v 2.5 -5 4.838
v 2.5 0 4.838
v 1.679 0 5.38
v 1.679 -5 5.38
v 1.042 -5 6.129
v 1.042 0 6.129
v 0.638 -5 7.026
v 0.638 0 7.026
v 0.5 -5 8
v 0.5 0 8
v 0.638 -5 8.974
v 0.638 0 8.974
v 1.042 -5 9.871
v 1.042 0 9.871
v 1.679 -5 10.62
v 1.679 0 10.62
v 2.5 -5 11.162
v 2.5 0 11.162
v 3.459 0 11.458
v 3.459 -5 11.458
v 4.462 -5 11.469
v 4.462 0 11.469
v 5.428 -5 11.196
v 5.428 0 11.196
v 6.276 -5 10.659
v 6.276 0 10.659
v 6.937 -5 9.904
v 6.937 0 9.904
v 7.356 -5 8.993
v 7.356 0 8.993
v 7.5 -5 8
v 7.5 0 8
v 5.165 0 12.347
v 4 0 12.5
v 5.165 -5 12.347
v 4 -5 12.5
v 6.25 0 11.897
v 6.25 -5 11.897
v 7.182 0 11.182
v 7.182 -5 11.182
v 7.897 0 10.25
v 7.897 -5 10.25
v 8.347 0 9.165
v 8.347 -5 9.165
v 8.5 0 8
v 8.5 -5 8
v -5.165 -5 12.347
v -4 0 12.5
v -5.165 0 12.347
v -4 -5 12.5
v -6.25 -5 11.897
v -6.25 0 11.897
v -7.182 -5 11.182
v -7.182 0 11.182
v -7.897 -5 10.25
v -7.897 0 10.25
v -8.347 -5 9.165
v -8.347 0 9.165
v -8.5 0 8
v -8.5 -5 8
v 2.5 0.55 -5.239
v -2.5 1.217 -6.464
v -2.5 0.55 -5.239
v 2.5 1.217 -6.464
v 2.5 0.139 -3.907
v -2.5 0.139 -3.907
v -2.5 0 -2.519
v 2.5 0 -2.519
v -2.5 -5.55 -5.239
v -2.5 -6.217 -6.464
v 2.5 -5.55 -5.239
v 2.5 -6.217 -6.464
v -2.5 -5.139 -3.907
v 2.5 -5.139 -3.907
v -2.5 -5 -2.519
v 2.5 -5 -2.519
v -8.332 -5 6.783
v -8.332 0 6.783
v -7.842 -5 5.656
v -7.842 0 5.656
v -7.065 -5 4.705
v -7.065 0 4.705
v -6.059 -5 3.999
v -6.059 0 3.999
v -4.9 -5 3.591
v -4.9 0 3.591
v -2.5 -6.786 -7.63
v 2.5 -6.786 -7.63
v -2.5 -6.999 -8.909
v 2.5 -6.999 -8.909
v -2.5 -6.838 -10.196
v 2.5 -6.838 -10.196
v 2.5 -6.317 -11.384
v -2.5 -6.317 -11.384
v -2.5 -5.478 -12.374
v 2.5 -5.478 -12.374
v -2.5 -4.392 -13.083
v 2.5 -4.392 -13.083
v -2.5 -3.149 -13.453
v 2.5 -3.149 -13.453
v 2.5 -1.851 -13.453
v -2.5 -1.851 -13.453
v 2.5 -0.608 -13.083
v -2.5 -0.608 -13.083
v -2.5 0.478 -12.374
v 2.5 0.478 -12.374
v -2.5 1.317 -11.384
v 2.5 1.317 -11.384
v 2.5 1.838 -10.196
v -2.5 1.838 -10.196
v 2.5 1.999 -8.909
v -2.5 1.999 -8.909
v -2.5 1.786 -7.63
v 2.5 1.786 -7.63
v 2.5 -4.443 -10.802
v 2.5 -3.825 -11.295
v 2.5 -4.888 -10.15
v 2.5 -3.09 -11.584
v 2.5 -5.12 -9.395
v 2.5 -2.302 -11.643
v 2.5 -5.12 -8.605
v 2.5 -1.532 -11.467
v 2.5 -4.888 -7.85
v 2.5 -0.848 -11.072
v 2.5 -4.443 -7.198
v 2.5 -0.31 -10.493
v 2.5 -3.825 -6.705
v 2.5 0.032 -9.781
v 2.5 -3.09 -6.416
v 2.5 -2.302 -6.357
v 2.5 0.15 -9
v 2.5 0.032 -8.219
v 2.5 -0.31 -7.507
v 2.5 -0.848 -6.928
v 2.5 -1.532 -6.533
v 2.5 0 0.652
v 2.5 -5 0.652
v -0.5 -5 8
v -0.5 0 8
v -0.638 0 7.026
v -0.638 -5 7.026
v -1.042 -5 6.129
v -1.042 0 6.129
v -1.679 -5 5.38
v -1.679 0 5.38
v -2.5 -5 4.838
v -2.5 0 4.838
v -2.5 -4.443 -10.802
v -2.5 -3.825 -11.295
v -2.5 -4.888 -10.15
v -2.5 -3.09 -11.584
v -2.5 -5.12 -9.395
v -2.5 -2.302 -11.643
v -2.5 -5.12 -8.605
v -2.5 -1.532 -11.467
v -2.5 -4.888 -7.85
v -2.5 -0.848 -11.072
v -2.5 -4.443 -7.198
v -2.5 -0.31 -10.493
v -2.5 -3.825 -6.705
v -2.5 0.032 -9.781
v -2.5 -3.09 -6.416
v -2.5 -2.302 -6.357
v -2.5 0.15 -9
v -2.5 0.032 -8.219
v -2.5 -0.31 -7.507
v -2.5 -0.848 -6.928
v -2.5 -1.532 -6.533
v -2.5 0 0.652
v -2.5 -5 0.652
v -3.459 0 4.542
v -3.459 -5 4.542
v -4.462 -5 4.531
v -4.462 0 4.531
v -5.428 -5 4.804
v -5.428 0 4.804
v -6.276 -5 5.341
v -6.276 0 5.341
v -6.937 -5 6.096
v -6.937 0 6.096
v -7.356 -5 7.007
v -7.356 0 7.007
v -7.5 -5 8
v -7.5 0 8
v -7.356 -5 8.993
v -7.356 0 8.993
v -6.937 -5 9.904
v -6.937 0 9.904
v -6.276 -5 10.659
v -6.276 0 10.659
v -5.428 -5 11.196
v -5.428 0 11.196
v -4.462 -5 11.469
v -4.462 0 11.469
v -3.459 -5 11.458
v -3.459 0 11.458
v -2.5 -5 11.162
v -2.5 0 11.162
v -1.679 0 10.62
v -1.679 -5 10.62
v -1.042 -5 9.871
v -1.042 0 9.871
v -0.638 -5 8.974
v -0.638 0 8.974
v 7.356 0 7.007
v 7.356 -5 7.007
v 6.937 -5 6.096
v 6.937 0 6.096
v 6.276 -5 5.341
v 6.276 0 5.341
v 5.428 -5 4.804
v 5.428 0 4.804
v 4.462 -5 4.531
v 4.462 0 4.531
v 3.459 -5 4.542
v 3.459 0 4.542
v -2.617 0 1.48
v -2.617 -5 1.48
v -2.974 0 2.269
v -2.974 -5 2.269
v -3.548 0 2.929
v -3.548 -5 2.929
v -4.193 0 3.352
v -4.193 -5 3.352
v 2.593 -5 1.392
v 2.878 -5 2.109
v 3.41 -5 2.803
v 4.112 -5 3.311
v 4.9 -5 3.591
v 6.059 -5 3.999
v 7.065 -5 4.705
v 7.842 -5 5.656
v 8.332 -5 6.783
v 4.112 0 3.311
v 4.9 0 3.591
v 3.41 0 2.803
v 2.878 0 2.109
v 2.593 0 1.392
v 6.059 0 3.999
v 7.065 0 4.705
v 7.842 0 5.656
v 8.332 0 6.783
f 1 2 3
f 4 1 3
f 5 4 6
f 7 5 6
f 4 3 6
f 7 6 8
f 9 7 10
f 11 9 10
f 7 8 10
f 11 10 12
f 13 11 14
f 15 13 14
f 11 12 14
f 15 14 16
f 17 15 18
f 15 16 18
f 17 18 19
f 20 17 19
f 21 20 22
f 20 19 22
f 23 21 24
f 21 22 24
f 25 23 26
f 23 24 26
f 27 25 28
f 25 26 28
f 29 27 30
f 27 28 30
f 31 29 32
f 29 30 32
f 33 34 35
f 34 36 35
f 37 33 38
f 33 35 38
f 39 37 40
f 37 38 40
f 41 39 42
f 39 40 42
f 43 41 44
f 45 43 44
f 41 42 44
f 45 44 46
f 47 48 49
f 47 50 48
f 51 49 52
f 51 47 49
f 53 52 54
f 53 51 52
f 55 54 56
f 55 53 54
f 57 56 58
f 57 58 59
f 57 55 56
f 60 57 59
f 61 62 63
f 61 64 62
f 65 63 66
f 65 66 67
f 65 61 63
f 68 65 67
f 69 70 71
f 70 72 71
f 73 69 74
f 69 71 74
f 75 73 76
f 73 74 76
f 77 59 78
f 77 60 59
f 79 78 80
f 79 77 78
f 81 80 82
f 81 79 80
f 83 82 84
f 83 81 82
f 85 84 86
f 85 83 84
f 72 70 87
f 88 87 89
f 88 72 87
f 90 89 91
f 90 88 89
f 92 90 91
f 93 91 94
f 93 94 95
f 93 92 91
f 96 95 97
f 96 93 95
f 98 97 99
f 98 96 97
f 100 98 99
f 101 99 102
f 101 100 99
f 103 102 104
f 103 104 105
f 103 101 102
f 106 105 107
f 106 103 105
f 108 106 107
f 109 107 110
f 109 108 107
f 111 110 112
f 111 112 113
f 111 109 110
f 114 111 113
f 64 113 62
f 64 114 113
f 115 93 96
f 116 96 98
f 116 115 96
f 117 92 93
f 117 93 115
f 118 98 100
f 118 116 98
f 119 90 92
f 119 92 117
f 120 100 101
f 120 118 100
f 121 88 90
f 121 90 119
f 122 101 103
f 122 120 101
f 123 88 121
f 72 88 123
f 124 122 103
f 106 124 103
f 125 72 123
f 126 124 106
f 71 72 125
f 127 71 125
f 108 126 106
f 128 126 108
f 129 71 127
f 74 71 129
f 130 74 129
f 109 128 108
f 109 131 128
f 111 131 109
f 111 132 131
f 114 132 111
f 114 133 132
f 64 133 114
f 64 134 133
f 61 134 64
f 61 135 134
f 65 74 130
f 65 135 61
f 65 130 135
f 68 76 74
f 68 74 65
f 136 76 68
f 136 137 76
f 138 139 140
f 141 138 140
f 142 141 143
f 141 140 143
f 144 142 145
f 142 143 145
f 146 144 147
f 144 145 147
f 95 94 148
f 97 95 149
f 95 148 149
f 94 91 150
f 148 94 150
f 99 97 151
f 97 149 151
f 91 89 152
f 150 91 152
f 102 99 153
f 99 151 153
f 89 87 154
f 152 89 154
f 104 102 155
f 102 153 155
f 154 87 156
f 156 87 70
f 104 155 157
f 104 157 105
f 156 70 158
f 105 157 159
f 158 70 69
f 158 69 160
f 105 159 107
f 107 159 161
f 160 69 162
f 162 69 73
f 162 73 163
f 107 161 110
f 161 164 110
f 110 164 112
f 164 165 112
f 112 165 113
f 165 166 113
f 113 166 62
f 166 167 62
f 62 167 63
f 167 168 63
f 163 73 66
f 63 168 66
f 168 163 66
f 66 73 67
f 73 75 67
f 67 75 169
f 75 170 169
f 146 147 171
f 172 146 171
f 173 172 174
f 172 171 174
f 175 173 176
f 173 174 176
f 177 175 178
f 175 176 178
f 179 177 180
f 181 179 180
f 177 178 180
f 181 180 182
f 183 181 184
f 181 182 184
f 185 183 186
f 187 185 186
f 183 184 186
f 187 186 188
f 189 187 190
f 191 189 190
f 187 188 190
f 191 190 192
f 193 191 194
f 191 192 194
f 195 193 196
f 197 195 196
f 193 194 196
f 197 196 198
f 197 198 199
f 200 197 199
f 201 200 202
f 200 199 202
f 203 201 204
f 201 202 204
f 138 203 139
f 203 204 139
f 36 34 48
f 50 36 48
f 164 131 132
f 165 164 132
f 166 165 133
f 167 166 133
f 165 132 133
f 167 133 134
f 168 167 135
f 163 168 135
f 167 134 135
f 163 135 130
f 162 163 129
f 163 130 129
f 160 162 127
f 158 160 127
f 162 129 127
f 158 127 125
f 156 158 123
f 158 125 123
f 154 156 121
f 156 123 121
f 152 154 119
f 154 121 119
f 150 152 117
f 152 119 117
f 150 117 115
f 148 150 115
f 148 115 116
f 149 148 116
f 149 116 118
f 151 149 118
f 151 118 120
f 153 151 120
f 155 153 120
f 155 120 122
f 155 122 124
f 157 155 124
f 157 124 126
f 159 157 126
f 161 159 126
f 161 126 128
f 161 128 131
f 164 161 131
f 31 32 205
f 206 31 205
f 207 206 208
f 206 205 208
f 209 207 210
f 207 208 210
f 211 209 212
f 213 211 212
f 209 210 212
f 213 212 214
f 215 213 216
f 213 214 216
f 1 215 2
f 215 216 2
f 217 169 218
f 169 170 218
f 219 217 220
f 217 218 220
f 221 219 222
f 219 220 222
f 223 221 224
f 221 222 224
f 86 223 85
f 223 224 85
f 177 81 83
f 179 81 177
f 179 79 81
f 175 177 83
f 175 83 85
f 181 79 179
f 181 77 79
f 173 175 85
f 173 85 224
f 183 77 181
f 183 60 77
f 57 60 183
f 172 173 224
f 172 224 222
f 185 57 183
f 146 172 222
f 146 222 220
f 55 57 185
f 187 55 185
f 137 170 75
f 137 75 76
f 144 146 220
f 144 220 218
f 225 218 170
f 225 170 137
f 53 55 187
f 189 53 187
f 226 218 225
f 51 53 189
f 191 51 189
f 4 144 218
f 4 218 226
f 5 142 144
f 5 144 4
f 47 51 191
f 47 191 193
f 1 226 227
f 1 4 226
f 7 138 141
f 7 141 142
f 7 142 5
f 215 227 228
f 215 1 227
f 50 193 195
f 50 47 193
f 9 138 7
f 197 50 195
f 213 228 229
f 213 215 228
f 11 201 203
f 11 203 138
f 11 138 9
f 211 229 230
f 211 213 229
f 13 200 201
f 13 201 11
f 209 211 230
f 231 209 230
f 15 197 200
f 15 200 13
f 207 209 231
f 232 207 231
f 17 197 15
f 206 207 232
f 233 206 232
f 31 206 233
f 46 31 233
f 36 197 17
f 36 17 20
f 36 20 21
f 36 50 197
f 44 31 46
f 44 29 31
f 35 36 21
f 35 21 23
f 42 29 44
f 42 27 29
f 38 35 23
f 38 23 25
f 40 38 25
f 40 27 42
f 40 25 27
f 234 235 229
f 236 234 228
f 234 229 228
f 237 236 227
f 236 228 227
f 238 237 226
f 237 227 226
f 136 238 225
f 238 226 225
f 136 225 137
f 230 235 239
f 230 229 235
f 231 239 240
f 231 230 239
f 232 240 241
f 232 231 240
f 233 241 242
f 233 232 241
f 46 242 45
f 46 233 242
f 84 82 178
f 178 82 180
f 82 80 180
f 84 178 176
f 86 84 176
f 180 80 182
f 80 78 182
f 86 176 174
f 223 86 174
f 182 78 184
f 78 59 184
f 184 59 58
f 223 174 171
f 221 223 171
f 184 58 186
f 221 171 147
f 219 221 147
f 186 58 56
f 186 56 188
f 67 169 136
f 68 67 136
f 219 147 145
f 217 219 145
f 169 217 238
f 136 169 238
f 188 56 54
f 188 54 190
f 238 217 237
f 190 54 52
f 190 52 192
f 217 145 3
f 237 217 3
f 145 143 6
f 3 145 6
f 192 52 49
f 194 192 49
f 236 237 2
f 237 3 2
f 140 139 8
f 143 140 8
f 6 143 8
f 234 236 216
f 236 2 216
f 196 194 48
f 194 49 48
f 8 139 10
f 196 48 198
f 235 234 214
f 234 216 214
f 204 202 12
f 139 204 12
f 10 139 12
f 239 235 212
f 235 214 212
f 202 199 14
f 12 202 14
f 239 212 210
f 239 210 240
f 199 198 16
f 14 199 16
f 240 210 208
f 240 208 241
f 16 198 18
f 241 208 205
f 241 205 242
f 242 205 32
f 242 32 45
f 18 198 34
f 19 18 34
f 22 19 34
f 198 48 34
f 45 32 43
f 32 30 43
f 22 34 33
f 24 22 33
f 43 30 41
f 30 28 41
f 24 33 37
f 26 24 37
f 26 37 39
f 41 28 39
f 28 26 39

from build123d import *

# Parameters (mm, degrees)
F0_W        = 5
F0_H        = 16
F1_DEPTH    = 5
F2_R        = 4.49999
F3_T1_DEPTH = 22.5
F4_R        = 3
F5_R        = 4.5
F6_DEPTH    = 2.5
F7_R        = 2.65
F8_DEPTH    = 25
F9_R        = 7


# Not quite as in the source:
# - a fillet or chamfer that OpenCascade refuses, or shapes differently, is made with other operations: its cross-section is extruded or revolved along the edge and cut away or added
# - a fillet or chamfer is up to 0.001 mm smaller than in the source, because OpenCascade refuses the exact size


with BuildPart() as f1:
    # F0 (on Front) → F1 (new body)
    with BuildSketch(Plane.XZ):
        with BuildLine():
            Line((8.5, 12.5), (2.5, 12.5))
            Line((2.5, 12.5), (2.5, 11.1622776602))
            ThreePointArc((2.5, 11.1622776602), (5.8708286934, 10.9580398915), (7.5, 8))
            ThreePointArc((7.5, 8), (5.8708286934, 5.0419601085), (2.5, 4.8377223398))
            Line((2.5, 4.8377223398), (2.5, 3.5))
            Line((2.5, 3.5), (8.5, 3.5))
            Line((8.5, 3.5), (8.5, 12.5))
        make_face()
        with BuildLine():
            Line((-2.5, 11.1622776602), (-2.5, 12.5))
            Line((-2.5, 12.5), (-8.5, 12.5))
            Line((-8.5, 12.5), (-8.5, 3.5))
            Line((-8.5, 3.5), (-2.5, 3.5))
            Line((-2.5, 3.5), (-2.5, 4.8377223398))
            ThreePointArc((-2.5, 4.8377223398), (-7.5, 8), (-2.5, 11.1622776602))
        make_face()
        with BuildLine():
            Line((2.5, 11.1622776602), (2.5, 12.5))
            Line((2.5, 12.5), (-2.5, 12.5))
            Line((-2.5, 12.5), (-2.5, 11.1622776602))
            ThreePointArc((-2.5, 11.1622776602), (-1.0419601085, 9.8708286934), (-0.5, 8))
            ThreePointArc((-0.5, 8), (-1.0419601085, 6.1291713066), (-2.5, 4.8377223398))
            Line((-2.5, 4.8377223398), (-2.5, 3.5))
            Line((-2.5, 3.5), (2.5, 3.5))
            Line((2.5, 3.5), (2.5, 4.8377223398))
            ThreePointArc((2.5, 4.8377223398), (0.5, 8), (2.5, 11.1622776602))
        make_face()
        with Locations((0, -4.5)):
            Rectangle(F0_W, F0_H)
    extrude(amount=F1_DEPTH)

    # F2 (radius 4.5 in the source; OpenCascade refuses exactly that, so slightly less here)
    f2_edges = [f1.edges().sort_by_distance(p)[0] for p in [
        (8.5, -2.5, 12.5),
        (-8.5, -2.5, 12.5),
        (8.5, -2.5, 3.5),
        (-8.5, -2.5, 3.5),
    ]]
    fillet(f2_edges, radius=F2_R)

    # F3: fillet of radius 3.5 on 2 edges, made by hand

    # F3_s2 → F3_t1 (cut)
    with BuildSketch(Plane.YZ.offset(-11.25)):
        with BuildLine():
            ThreePointArc((0, -9), (-1.0251262658, -11.4748737342), (-3.5, -12.5))
            Line((-3.5, -12.5), (0, -12.5))
            Line((0, -12.5), (0, -9))
        make_face()
        with BuildLine():
            ThreePointArc((-5, -9), (-3.9748737342, -11.4748737342), (-1.5, -12.5))
            Line((-1.5, -12.5), (-5, -12.5))
            Line((-5, -12.5), (-5, -9))
        make_face()
    extrude(amount=F3_T1_DEPTH, mode=Mode.SUBTRACT)

    # F4
    f4_edges = [f1.edges().sort_by_distance(p)[0] for p in [
        (2.5, -2.5, 3.5),
        (-2.5, -2.5, 3.5),
    ]]
    fillet(f4_edges, radius=F4_R)

    # F5 (on Right) → F6 (join, symmetric)
    with BuildSketch(Plane.YZ):
        with Locations((-2.5, -9)):
            Circle(F5_R)
    extrude(amount=F6_DEPTH, both=True)

    # F7 (on face) → F8 (cut)
    with BuildSketch(Plane.YZ.offset(2.5)):
        with Locations((-2.5, -9)):
            Circle(F7_R)
    extrude(amount=-F8_DEPTH, mode=Mode.SUBTRACT)

    # F9
    f9_edges = [f1.edges().sort_by_distance(p)[0] for p in [
        (0, 0, -5.258343),
        (0, -5, -5.258343),
    ]]
    fillet(f9_edges, radius=F9_R)


solid = f1.part
